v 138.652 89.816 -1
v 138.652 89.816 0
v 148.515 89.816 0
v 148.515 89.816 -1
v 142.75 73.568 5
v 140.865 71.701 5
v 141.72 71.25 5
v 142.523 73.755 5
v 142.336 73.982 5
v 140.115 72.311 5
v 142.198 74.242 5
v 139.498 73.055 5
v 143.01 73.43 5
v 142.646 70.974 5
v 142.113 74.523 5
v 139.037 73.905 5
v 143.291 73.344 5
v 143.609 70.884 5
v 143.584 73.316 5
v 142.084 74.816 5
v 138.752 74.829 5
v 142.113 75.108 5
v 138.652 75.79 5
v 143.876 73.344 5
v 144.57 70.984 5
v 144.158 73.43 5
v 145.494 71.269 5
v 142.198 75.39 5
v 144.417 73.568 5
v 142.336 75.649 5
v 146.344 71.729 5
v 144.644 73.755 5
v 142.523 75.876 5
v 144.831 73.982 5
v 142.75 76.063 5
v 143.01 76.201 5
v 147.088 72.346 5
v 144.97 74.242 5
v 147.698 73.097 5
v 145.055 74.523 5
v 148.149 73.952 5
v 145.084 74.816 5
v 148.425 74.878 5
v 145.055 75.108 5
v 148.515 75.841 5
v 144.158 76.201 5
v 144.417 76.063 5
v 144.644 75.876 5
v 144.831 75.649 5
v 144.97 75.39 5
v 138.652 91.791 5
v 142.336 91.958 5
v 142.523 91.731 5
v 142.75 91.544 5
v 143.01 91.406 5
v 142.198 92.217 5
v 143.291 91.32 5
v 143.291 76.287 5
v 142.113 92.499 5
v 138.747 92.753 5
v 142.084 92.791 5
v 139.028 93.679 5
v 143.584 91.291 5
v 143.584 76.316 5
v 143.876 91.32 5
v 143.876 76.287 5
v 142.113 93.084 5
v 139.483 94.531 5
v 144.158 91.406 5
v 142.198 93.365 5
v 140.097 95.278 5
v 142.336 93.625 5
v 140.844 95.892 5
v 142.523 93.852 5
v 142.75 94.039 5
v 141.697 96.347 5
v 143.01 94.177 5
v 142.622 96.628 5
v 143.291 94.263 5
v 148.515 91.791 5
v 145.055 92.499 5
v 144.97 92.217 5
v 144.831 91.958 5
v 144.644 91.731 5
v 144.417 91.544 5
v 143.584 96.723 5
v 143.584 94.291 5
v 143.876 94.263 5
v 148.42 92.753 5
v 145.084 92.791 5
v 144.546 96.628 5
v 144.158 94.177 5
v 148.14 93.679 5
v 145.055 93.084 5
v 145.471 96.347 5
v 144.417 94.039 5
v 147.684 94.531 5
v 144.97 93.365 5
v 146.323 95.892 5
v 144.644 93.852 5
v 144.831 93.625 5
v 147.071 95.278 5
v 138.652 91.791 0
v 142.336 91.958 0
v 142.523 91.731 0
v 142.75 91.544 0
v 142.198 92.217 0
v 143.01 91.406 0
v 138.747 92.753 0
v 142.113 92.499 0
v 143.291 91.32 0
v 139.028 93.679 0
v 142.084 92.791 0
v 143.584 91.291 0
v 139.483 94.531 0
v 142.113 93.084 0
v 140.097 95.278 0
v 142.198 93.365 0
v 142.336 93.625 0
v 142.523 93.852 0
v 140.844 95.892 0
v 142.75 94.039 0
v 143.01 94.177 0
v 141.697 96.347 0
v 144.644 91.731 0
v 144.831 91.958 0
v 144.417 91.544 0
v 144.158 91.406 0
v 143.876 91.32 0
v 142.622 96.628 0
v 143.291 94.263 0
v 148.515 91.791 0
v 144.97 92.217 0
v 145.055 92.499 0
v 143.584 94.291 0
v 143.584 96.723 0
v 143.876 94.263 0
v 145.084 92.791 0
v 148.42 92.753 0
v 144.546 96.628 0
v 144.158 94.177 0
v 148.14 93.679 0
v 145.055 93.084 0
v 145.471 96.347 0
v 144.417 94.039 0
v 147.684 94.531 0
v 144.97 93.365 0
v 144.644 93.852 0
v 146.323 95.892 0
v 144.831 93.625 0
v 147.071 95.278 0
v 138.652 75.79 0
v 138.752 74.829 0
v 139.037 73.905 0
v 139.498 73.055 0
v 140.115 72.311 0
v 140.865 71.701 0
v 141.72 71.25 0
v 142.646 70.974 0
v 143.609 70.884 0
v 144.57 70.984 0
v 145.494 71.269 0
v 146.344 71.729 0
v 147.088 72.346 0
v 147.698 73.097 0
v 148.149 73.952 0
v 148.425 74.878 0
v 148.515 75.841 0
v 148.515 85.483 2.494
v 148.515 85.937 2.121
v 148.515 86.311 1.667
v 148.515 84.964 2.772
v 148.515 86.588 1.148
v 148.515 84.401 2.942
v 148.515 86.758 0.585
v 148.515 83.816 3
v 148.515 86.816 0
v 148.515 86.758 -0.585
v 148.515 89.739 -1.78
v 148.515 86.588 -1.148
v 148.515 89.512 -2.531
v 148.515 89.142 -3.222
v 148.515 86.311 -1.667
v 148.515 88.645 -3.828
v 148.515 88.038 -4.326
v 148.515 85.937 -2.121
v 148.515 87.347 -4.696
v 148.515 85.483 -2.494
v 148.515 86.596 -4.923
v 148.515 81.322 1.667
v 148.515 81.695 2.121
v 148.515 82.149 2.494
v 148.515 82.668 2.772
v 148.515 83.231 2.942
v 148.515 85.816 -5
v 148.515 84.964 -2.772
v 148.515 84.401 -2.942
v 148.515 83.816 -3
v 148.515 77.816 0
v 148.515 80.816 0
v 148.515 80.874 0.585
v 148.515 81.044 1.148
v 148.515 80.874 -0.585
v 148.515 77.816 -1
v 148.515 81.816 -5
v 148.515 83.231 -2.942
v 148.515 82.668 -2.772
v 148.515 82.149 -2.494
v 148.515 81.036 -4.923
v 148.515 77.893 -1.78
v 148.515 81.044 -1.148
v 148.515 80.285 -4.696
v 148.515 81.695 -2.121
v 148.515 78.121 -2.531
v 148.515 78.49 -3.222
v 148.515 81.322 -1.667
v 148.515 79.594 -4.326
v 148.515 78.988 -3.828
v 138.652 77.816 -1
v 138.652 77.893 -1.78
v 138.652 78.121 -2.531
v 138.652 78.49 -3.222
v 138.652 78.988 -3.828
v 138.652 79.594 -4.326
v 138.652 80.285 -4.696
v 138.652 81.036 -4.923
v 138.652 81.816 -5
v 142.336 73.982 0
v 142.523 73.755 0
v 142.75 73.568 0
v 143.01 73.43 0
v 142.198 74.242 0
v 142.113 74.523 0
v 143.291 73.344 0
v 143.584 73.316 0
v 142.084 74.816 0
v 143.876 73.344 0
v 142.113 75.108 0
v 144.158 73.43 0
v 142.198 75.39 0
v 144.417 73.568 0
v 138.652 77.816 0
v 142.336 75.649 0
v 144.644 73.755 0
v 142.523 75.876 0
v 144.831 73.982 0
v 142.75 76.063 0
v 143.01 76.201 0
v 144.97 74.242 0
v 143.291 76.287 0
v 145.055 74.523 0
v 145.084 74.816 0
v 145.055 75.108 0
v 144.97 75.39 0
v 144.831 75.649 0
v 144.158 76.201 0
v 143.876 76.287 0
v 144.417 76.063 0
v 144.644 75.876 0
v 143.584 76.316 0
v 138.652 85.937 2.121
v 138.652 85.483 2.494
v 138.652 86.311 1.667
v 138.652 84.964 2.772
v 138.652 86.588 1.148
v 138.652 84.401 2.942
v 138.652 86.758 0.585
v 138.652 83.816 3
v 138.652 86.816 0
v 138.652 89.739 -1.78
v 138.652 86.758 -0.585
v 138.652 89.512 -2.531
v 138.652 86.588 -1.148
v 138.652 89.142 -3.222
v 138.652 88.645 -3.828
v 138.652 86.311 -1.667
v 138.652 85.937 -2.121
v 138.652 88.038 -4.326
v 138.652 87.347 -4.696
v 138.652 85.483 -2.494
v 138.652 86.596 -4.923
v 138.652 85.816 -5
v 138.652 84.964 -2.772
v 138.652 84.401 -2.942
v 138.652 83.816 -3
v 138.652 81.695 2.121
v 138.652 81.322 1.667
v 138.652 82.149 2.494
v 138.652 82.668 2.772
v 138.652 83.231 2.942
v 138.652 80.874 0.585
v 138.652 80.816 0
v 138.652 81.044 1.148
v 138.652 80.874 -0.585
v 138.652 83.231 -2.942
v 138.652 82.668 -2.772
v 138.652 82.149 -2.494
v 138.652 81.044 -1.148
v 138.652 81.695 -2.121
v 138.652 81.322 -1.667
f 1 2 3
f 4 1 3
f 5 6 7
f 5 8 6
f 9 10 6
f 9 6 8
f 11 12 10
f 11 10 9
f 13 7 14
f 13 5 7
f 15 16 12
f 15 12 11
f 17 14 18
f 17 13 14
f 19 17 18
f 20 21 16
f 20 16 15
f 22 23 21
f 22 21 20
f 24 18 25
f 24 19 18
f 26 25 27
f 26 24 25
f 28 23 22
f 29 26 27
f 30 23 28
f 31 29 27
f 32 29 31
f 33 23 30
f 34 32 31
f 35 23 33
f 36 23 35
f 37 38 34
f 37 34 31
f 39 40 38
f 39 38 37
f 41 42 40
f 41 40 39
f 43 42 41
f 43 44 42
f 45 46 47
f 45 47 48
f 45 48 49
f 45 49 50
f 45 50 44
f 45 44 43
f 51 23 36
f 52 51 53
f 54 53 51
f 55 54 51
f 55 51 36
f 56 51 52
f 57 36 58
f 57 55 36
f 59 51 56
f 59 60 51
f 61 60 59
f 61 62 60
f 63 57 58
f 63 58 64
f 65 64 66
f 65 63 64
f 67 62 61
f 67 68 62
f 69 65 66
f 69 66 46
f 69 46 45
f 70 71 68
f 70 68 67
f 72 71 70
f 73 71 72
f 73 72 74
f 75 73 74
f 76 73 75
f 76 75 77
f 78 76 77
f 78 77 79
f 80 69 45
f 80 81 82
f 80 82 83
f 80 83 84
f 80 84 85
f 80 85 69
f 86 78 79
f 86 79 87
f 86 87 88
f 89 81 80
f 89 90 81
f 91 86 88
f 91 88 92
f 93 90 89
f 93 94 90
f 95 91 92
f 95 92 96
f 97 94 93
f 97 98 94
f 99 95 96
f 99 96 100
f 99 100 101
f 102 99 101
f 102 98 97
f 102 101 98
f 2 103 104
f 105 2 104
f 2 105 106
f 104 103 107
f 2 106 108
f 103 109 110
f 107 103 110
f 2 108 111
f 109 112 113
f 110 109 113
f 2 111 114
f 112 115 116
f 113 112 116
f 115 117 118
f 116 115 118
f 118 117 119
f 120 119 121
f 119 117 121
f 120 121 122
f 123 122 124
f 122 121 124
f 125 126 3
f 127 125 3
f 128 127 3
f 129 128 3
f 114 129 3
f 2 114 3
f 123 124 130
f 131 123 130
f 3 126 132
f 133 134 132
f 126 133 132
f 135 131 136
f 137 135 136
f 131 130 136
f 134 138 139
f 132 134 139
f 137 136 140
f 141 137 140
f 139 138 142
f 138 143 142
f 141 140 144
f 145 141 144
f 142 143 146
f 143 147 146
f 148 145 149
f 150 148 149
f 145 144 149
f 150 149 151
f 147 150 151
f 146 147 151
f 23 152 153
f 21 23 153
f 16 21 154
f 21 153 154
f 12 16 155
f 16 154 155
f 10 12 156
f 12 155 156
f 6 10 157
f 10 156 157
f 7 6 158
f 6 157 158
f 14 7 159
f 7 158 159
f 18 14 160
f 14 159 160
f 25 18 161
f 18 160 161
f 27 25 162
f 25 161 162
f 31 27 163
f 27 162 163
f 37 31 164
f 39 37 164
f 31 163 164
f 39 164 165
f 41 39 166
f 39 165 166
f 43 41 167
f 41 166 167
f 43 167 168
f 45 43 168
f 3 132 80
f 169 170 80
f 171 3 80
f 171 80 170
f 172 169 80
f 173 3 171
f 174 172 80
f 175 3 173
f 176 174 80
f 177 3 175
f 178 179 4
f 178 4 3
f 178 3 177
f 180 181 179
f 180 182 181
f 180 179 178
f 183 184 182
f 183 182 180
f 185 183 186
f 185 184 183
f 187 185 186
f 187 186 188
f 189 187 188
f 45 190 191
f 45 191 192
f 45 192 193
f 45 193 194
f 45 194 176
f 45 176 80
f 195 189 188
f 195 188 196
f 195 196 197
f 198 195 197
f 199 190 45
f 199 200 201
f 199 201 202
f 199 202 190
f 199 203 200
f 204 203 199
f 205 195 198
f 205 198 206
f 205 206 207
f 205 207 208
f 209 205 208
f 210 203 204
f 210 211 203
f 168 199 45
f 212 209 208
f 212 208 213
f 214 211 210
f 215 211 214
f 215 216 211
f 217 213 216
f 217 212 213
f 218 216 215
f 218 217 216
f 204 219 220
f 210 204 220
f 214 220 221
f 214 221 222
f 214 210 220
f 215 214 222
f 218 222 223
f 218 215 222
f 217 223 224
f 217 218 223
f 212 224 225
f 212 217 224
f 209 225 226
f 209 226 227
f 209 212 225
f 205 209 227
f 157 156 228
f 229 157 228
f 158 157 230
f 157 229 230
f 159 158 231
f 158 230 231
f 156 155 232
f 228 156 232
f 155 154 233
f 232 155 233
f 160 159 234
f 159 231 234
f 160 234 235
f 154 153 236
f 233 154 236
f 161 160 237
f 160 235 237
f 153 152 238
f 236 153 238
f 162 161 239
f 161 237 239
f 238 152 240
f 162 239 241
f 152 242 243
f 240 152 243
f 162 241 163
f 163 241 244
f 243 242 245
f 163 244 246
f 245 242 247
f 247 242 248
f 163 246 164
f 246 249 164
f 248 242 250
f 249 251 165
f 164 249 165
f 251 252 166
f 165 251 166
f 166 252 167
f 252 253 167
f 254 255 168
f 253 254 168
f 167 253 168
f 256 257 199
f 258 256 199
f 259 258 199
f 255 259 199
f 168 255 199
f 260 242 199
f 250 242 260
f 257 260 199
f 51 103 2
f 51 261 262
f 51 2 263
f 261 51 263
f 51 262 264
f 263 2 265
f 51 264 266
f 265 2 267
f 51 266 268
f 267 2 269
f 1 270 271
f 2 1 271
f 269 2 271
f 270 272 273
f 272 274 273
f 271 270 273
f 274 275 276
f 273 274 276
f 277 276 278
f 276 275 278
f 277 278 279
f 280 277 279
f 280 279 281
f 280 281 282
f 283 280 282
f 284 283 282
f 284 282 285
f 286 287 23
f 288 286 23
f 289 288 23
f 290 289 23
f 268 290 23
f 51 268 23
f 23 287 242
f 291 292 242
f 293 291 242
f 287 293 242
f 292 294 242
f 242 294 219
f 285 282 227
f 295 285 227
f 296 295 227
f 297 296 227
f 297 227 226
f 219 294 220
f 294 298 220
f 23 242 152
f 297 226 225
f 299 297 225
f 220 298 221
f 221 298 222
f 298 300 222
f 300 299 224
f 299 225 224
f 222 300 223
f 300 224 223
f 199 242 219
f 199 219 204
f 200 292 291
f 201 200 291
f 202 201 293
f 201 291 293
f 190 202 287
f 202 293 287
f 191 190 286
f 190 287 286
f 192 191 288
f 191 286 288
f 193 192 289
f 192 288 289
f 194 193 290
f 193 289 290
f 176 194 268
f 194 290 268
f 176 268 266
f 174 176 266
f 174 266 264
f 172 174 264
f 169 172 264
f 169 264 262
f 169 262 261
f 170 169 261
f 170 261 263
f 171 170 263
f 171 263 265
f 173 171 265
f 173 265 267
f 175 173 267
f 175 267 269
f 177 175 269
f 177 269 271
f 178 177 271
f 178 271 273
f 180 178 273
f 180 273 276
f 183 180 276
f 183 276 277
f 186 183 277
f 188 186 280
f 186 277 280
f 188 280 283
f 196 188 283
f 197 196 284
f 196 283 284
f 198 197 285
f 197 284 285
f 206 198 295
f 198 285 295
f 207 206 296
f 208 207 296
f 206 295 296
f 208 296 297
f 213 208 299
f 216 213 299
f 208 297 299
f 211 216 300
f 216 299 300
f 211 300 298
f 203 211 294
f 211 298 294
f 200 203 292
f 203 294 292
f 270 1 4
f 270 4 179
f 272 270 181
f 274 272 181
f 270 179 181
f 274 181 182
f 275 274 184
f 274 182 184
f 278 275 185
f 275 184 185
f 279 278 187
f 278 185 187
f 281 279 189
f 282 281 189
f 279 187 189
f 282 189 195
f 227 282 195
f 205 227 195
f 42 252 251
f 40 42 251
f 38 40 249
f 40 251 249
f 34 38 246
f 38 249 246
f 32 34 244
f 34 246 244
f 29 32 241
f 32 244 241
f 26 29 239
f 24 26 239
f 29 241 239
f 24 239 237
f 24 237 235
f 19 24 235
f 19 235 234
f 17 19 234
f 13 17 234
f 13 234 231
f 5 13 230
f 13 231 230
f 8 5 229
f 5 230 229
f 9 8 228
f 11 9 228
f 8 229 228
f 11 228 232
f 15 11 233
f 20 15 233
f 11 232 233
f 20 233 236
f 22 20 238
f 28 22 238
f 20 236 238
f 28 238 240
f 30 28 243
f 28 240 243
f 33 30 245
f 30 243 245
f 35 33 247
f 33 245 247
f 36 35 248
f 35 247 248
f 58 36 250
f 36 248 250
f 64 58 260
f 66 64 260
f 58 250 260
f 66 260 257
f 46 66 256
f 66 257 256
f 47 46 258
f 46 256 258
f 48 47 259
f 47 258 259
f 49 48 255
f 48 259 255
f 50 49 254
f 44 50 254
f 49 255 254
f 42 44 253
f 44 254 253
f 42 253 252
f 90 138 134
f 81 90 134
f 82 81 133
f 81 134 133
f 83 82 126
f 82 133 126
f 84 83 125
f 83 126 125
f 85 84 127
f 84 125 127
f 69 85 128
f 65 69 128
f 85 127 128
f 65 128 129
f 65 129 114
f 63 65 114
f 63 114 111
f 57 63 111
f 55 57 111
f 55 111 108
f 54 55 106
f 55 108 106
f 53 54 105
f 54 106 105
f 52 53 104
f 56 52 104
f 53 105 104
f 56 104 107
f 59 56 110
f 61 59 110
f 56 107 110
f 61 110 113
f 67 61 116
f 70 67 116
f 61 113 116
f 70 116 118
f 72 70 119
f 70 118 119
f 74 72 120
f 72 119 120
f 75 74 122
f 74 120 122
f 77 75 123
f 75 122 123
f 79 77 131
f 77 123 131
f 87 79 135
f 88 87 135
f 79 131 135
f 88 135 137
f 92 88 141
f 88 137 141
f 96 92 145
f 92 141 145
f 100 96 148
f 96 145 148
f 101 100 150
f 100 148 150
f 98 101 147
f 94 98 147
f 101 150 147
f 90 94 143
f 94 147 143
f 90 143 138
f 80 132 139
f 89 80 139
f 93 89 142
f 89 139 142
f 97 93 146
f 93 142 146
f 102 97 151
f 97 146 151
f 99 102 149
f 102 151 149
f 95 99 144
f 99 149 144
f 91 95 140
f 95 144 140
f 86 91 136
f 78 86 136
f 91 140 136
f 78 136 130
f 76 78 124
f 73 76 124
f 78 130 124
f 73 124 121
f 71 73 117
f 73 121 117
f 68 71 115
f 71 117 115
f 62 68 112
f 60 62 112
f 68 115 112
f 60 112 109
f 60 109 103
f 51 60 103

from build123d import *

# Parameters (mm, degrees)
PAD_DEPTH       = 5
SKETCH001_W     = 9.862508
SKETCH001_H     = 12
PAD001_DEPTH    = 10
SKETCH002_R     = 3
POCKET_DEPTH    = 9.863573
SKETCH003_R     = 1.5
POCKET001_DEPTH = 5
FILLET_R        = 4


with BuildPart() as part:
    # Sketch → Pad (new body)
    with BuildSketch(Plane.XY):
        with BuildLine():
            Line((138.65243, 91.791451), (138.65243, 75.79029))
            ThreePointArc((138.65243, 75.79029), (143.608931, 70.884283), (148.514938, 75.840785))
            Line((148.514938, 91.791451), (148.514938, 75.840785))
            ThreePointArc((148.514938, 91.791451), (143.583684, 96.722705), (138.65243, 91.791451))
        make_face()
    extrude(amount=PAD_DEPTH)

    # Sketch001 → Pad001 (join)
    with BuildSketch(Plane.XY.offset(5)):
        with Locations((143.583684, 83.816118)):
            Rectangle(SKETCH001_W, SKETCH001_H)
    extrude(amount=-PAD001_DEPTH)

    # Sketch002 (on Face9 of Pad001) → Pocket (cut, through all)
    with BuildSketch(Plane(origin=(138.65243, 0, 0), x_dir=(0, -1, 0), z_dir=(-1, 0, 0))):
        with Locations((-83.816118, 0)):
            Circle(SKETCH002_R)
    extrude(amount=-POCKET_DEPTH, mode=Mode.SUBTRACT)

    # Sketch003 (on Face10 of Pocket) → Pocket001 (cut)
    with BuildSketch(Plane(origin=(0, 0, 0), x_dir=(1, 0, 0), z_dir=(0, 0, -1))):
        with Locations((143.583684, -74.815537)):
            Circle(SKETCH003_R)
        with Locations((143.583684, -92.791451)):
            Circle(SKETCH003_R)
    extrude(amount=-POCKET001_DEPTH, mode=Mode.SUBTRACT)

    # Fillet
    fillet_edges = [part.edges().sort_by_distance(p)[0] for p in [
        (143.583684, 89.816118, -5),
        (143.583684, 77.816118, -5),
    ]]
    fillet(fillet_edges, radius=FILLET_R)


solid = part.part
